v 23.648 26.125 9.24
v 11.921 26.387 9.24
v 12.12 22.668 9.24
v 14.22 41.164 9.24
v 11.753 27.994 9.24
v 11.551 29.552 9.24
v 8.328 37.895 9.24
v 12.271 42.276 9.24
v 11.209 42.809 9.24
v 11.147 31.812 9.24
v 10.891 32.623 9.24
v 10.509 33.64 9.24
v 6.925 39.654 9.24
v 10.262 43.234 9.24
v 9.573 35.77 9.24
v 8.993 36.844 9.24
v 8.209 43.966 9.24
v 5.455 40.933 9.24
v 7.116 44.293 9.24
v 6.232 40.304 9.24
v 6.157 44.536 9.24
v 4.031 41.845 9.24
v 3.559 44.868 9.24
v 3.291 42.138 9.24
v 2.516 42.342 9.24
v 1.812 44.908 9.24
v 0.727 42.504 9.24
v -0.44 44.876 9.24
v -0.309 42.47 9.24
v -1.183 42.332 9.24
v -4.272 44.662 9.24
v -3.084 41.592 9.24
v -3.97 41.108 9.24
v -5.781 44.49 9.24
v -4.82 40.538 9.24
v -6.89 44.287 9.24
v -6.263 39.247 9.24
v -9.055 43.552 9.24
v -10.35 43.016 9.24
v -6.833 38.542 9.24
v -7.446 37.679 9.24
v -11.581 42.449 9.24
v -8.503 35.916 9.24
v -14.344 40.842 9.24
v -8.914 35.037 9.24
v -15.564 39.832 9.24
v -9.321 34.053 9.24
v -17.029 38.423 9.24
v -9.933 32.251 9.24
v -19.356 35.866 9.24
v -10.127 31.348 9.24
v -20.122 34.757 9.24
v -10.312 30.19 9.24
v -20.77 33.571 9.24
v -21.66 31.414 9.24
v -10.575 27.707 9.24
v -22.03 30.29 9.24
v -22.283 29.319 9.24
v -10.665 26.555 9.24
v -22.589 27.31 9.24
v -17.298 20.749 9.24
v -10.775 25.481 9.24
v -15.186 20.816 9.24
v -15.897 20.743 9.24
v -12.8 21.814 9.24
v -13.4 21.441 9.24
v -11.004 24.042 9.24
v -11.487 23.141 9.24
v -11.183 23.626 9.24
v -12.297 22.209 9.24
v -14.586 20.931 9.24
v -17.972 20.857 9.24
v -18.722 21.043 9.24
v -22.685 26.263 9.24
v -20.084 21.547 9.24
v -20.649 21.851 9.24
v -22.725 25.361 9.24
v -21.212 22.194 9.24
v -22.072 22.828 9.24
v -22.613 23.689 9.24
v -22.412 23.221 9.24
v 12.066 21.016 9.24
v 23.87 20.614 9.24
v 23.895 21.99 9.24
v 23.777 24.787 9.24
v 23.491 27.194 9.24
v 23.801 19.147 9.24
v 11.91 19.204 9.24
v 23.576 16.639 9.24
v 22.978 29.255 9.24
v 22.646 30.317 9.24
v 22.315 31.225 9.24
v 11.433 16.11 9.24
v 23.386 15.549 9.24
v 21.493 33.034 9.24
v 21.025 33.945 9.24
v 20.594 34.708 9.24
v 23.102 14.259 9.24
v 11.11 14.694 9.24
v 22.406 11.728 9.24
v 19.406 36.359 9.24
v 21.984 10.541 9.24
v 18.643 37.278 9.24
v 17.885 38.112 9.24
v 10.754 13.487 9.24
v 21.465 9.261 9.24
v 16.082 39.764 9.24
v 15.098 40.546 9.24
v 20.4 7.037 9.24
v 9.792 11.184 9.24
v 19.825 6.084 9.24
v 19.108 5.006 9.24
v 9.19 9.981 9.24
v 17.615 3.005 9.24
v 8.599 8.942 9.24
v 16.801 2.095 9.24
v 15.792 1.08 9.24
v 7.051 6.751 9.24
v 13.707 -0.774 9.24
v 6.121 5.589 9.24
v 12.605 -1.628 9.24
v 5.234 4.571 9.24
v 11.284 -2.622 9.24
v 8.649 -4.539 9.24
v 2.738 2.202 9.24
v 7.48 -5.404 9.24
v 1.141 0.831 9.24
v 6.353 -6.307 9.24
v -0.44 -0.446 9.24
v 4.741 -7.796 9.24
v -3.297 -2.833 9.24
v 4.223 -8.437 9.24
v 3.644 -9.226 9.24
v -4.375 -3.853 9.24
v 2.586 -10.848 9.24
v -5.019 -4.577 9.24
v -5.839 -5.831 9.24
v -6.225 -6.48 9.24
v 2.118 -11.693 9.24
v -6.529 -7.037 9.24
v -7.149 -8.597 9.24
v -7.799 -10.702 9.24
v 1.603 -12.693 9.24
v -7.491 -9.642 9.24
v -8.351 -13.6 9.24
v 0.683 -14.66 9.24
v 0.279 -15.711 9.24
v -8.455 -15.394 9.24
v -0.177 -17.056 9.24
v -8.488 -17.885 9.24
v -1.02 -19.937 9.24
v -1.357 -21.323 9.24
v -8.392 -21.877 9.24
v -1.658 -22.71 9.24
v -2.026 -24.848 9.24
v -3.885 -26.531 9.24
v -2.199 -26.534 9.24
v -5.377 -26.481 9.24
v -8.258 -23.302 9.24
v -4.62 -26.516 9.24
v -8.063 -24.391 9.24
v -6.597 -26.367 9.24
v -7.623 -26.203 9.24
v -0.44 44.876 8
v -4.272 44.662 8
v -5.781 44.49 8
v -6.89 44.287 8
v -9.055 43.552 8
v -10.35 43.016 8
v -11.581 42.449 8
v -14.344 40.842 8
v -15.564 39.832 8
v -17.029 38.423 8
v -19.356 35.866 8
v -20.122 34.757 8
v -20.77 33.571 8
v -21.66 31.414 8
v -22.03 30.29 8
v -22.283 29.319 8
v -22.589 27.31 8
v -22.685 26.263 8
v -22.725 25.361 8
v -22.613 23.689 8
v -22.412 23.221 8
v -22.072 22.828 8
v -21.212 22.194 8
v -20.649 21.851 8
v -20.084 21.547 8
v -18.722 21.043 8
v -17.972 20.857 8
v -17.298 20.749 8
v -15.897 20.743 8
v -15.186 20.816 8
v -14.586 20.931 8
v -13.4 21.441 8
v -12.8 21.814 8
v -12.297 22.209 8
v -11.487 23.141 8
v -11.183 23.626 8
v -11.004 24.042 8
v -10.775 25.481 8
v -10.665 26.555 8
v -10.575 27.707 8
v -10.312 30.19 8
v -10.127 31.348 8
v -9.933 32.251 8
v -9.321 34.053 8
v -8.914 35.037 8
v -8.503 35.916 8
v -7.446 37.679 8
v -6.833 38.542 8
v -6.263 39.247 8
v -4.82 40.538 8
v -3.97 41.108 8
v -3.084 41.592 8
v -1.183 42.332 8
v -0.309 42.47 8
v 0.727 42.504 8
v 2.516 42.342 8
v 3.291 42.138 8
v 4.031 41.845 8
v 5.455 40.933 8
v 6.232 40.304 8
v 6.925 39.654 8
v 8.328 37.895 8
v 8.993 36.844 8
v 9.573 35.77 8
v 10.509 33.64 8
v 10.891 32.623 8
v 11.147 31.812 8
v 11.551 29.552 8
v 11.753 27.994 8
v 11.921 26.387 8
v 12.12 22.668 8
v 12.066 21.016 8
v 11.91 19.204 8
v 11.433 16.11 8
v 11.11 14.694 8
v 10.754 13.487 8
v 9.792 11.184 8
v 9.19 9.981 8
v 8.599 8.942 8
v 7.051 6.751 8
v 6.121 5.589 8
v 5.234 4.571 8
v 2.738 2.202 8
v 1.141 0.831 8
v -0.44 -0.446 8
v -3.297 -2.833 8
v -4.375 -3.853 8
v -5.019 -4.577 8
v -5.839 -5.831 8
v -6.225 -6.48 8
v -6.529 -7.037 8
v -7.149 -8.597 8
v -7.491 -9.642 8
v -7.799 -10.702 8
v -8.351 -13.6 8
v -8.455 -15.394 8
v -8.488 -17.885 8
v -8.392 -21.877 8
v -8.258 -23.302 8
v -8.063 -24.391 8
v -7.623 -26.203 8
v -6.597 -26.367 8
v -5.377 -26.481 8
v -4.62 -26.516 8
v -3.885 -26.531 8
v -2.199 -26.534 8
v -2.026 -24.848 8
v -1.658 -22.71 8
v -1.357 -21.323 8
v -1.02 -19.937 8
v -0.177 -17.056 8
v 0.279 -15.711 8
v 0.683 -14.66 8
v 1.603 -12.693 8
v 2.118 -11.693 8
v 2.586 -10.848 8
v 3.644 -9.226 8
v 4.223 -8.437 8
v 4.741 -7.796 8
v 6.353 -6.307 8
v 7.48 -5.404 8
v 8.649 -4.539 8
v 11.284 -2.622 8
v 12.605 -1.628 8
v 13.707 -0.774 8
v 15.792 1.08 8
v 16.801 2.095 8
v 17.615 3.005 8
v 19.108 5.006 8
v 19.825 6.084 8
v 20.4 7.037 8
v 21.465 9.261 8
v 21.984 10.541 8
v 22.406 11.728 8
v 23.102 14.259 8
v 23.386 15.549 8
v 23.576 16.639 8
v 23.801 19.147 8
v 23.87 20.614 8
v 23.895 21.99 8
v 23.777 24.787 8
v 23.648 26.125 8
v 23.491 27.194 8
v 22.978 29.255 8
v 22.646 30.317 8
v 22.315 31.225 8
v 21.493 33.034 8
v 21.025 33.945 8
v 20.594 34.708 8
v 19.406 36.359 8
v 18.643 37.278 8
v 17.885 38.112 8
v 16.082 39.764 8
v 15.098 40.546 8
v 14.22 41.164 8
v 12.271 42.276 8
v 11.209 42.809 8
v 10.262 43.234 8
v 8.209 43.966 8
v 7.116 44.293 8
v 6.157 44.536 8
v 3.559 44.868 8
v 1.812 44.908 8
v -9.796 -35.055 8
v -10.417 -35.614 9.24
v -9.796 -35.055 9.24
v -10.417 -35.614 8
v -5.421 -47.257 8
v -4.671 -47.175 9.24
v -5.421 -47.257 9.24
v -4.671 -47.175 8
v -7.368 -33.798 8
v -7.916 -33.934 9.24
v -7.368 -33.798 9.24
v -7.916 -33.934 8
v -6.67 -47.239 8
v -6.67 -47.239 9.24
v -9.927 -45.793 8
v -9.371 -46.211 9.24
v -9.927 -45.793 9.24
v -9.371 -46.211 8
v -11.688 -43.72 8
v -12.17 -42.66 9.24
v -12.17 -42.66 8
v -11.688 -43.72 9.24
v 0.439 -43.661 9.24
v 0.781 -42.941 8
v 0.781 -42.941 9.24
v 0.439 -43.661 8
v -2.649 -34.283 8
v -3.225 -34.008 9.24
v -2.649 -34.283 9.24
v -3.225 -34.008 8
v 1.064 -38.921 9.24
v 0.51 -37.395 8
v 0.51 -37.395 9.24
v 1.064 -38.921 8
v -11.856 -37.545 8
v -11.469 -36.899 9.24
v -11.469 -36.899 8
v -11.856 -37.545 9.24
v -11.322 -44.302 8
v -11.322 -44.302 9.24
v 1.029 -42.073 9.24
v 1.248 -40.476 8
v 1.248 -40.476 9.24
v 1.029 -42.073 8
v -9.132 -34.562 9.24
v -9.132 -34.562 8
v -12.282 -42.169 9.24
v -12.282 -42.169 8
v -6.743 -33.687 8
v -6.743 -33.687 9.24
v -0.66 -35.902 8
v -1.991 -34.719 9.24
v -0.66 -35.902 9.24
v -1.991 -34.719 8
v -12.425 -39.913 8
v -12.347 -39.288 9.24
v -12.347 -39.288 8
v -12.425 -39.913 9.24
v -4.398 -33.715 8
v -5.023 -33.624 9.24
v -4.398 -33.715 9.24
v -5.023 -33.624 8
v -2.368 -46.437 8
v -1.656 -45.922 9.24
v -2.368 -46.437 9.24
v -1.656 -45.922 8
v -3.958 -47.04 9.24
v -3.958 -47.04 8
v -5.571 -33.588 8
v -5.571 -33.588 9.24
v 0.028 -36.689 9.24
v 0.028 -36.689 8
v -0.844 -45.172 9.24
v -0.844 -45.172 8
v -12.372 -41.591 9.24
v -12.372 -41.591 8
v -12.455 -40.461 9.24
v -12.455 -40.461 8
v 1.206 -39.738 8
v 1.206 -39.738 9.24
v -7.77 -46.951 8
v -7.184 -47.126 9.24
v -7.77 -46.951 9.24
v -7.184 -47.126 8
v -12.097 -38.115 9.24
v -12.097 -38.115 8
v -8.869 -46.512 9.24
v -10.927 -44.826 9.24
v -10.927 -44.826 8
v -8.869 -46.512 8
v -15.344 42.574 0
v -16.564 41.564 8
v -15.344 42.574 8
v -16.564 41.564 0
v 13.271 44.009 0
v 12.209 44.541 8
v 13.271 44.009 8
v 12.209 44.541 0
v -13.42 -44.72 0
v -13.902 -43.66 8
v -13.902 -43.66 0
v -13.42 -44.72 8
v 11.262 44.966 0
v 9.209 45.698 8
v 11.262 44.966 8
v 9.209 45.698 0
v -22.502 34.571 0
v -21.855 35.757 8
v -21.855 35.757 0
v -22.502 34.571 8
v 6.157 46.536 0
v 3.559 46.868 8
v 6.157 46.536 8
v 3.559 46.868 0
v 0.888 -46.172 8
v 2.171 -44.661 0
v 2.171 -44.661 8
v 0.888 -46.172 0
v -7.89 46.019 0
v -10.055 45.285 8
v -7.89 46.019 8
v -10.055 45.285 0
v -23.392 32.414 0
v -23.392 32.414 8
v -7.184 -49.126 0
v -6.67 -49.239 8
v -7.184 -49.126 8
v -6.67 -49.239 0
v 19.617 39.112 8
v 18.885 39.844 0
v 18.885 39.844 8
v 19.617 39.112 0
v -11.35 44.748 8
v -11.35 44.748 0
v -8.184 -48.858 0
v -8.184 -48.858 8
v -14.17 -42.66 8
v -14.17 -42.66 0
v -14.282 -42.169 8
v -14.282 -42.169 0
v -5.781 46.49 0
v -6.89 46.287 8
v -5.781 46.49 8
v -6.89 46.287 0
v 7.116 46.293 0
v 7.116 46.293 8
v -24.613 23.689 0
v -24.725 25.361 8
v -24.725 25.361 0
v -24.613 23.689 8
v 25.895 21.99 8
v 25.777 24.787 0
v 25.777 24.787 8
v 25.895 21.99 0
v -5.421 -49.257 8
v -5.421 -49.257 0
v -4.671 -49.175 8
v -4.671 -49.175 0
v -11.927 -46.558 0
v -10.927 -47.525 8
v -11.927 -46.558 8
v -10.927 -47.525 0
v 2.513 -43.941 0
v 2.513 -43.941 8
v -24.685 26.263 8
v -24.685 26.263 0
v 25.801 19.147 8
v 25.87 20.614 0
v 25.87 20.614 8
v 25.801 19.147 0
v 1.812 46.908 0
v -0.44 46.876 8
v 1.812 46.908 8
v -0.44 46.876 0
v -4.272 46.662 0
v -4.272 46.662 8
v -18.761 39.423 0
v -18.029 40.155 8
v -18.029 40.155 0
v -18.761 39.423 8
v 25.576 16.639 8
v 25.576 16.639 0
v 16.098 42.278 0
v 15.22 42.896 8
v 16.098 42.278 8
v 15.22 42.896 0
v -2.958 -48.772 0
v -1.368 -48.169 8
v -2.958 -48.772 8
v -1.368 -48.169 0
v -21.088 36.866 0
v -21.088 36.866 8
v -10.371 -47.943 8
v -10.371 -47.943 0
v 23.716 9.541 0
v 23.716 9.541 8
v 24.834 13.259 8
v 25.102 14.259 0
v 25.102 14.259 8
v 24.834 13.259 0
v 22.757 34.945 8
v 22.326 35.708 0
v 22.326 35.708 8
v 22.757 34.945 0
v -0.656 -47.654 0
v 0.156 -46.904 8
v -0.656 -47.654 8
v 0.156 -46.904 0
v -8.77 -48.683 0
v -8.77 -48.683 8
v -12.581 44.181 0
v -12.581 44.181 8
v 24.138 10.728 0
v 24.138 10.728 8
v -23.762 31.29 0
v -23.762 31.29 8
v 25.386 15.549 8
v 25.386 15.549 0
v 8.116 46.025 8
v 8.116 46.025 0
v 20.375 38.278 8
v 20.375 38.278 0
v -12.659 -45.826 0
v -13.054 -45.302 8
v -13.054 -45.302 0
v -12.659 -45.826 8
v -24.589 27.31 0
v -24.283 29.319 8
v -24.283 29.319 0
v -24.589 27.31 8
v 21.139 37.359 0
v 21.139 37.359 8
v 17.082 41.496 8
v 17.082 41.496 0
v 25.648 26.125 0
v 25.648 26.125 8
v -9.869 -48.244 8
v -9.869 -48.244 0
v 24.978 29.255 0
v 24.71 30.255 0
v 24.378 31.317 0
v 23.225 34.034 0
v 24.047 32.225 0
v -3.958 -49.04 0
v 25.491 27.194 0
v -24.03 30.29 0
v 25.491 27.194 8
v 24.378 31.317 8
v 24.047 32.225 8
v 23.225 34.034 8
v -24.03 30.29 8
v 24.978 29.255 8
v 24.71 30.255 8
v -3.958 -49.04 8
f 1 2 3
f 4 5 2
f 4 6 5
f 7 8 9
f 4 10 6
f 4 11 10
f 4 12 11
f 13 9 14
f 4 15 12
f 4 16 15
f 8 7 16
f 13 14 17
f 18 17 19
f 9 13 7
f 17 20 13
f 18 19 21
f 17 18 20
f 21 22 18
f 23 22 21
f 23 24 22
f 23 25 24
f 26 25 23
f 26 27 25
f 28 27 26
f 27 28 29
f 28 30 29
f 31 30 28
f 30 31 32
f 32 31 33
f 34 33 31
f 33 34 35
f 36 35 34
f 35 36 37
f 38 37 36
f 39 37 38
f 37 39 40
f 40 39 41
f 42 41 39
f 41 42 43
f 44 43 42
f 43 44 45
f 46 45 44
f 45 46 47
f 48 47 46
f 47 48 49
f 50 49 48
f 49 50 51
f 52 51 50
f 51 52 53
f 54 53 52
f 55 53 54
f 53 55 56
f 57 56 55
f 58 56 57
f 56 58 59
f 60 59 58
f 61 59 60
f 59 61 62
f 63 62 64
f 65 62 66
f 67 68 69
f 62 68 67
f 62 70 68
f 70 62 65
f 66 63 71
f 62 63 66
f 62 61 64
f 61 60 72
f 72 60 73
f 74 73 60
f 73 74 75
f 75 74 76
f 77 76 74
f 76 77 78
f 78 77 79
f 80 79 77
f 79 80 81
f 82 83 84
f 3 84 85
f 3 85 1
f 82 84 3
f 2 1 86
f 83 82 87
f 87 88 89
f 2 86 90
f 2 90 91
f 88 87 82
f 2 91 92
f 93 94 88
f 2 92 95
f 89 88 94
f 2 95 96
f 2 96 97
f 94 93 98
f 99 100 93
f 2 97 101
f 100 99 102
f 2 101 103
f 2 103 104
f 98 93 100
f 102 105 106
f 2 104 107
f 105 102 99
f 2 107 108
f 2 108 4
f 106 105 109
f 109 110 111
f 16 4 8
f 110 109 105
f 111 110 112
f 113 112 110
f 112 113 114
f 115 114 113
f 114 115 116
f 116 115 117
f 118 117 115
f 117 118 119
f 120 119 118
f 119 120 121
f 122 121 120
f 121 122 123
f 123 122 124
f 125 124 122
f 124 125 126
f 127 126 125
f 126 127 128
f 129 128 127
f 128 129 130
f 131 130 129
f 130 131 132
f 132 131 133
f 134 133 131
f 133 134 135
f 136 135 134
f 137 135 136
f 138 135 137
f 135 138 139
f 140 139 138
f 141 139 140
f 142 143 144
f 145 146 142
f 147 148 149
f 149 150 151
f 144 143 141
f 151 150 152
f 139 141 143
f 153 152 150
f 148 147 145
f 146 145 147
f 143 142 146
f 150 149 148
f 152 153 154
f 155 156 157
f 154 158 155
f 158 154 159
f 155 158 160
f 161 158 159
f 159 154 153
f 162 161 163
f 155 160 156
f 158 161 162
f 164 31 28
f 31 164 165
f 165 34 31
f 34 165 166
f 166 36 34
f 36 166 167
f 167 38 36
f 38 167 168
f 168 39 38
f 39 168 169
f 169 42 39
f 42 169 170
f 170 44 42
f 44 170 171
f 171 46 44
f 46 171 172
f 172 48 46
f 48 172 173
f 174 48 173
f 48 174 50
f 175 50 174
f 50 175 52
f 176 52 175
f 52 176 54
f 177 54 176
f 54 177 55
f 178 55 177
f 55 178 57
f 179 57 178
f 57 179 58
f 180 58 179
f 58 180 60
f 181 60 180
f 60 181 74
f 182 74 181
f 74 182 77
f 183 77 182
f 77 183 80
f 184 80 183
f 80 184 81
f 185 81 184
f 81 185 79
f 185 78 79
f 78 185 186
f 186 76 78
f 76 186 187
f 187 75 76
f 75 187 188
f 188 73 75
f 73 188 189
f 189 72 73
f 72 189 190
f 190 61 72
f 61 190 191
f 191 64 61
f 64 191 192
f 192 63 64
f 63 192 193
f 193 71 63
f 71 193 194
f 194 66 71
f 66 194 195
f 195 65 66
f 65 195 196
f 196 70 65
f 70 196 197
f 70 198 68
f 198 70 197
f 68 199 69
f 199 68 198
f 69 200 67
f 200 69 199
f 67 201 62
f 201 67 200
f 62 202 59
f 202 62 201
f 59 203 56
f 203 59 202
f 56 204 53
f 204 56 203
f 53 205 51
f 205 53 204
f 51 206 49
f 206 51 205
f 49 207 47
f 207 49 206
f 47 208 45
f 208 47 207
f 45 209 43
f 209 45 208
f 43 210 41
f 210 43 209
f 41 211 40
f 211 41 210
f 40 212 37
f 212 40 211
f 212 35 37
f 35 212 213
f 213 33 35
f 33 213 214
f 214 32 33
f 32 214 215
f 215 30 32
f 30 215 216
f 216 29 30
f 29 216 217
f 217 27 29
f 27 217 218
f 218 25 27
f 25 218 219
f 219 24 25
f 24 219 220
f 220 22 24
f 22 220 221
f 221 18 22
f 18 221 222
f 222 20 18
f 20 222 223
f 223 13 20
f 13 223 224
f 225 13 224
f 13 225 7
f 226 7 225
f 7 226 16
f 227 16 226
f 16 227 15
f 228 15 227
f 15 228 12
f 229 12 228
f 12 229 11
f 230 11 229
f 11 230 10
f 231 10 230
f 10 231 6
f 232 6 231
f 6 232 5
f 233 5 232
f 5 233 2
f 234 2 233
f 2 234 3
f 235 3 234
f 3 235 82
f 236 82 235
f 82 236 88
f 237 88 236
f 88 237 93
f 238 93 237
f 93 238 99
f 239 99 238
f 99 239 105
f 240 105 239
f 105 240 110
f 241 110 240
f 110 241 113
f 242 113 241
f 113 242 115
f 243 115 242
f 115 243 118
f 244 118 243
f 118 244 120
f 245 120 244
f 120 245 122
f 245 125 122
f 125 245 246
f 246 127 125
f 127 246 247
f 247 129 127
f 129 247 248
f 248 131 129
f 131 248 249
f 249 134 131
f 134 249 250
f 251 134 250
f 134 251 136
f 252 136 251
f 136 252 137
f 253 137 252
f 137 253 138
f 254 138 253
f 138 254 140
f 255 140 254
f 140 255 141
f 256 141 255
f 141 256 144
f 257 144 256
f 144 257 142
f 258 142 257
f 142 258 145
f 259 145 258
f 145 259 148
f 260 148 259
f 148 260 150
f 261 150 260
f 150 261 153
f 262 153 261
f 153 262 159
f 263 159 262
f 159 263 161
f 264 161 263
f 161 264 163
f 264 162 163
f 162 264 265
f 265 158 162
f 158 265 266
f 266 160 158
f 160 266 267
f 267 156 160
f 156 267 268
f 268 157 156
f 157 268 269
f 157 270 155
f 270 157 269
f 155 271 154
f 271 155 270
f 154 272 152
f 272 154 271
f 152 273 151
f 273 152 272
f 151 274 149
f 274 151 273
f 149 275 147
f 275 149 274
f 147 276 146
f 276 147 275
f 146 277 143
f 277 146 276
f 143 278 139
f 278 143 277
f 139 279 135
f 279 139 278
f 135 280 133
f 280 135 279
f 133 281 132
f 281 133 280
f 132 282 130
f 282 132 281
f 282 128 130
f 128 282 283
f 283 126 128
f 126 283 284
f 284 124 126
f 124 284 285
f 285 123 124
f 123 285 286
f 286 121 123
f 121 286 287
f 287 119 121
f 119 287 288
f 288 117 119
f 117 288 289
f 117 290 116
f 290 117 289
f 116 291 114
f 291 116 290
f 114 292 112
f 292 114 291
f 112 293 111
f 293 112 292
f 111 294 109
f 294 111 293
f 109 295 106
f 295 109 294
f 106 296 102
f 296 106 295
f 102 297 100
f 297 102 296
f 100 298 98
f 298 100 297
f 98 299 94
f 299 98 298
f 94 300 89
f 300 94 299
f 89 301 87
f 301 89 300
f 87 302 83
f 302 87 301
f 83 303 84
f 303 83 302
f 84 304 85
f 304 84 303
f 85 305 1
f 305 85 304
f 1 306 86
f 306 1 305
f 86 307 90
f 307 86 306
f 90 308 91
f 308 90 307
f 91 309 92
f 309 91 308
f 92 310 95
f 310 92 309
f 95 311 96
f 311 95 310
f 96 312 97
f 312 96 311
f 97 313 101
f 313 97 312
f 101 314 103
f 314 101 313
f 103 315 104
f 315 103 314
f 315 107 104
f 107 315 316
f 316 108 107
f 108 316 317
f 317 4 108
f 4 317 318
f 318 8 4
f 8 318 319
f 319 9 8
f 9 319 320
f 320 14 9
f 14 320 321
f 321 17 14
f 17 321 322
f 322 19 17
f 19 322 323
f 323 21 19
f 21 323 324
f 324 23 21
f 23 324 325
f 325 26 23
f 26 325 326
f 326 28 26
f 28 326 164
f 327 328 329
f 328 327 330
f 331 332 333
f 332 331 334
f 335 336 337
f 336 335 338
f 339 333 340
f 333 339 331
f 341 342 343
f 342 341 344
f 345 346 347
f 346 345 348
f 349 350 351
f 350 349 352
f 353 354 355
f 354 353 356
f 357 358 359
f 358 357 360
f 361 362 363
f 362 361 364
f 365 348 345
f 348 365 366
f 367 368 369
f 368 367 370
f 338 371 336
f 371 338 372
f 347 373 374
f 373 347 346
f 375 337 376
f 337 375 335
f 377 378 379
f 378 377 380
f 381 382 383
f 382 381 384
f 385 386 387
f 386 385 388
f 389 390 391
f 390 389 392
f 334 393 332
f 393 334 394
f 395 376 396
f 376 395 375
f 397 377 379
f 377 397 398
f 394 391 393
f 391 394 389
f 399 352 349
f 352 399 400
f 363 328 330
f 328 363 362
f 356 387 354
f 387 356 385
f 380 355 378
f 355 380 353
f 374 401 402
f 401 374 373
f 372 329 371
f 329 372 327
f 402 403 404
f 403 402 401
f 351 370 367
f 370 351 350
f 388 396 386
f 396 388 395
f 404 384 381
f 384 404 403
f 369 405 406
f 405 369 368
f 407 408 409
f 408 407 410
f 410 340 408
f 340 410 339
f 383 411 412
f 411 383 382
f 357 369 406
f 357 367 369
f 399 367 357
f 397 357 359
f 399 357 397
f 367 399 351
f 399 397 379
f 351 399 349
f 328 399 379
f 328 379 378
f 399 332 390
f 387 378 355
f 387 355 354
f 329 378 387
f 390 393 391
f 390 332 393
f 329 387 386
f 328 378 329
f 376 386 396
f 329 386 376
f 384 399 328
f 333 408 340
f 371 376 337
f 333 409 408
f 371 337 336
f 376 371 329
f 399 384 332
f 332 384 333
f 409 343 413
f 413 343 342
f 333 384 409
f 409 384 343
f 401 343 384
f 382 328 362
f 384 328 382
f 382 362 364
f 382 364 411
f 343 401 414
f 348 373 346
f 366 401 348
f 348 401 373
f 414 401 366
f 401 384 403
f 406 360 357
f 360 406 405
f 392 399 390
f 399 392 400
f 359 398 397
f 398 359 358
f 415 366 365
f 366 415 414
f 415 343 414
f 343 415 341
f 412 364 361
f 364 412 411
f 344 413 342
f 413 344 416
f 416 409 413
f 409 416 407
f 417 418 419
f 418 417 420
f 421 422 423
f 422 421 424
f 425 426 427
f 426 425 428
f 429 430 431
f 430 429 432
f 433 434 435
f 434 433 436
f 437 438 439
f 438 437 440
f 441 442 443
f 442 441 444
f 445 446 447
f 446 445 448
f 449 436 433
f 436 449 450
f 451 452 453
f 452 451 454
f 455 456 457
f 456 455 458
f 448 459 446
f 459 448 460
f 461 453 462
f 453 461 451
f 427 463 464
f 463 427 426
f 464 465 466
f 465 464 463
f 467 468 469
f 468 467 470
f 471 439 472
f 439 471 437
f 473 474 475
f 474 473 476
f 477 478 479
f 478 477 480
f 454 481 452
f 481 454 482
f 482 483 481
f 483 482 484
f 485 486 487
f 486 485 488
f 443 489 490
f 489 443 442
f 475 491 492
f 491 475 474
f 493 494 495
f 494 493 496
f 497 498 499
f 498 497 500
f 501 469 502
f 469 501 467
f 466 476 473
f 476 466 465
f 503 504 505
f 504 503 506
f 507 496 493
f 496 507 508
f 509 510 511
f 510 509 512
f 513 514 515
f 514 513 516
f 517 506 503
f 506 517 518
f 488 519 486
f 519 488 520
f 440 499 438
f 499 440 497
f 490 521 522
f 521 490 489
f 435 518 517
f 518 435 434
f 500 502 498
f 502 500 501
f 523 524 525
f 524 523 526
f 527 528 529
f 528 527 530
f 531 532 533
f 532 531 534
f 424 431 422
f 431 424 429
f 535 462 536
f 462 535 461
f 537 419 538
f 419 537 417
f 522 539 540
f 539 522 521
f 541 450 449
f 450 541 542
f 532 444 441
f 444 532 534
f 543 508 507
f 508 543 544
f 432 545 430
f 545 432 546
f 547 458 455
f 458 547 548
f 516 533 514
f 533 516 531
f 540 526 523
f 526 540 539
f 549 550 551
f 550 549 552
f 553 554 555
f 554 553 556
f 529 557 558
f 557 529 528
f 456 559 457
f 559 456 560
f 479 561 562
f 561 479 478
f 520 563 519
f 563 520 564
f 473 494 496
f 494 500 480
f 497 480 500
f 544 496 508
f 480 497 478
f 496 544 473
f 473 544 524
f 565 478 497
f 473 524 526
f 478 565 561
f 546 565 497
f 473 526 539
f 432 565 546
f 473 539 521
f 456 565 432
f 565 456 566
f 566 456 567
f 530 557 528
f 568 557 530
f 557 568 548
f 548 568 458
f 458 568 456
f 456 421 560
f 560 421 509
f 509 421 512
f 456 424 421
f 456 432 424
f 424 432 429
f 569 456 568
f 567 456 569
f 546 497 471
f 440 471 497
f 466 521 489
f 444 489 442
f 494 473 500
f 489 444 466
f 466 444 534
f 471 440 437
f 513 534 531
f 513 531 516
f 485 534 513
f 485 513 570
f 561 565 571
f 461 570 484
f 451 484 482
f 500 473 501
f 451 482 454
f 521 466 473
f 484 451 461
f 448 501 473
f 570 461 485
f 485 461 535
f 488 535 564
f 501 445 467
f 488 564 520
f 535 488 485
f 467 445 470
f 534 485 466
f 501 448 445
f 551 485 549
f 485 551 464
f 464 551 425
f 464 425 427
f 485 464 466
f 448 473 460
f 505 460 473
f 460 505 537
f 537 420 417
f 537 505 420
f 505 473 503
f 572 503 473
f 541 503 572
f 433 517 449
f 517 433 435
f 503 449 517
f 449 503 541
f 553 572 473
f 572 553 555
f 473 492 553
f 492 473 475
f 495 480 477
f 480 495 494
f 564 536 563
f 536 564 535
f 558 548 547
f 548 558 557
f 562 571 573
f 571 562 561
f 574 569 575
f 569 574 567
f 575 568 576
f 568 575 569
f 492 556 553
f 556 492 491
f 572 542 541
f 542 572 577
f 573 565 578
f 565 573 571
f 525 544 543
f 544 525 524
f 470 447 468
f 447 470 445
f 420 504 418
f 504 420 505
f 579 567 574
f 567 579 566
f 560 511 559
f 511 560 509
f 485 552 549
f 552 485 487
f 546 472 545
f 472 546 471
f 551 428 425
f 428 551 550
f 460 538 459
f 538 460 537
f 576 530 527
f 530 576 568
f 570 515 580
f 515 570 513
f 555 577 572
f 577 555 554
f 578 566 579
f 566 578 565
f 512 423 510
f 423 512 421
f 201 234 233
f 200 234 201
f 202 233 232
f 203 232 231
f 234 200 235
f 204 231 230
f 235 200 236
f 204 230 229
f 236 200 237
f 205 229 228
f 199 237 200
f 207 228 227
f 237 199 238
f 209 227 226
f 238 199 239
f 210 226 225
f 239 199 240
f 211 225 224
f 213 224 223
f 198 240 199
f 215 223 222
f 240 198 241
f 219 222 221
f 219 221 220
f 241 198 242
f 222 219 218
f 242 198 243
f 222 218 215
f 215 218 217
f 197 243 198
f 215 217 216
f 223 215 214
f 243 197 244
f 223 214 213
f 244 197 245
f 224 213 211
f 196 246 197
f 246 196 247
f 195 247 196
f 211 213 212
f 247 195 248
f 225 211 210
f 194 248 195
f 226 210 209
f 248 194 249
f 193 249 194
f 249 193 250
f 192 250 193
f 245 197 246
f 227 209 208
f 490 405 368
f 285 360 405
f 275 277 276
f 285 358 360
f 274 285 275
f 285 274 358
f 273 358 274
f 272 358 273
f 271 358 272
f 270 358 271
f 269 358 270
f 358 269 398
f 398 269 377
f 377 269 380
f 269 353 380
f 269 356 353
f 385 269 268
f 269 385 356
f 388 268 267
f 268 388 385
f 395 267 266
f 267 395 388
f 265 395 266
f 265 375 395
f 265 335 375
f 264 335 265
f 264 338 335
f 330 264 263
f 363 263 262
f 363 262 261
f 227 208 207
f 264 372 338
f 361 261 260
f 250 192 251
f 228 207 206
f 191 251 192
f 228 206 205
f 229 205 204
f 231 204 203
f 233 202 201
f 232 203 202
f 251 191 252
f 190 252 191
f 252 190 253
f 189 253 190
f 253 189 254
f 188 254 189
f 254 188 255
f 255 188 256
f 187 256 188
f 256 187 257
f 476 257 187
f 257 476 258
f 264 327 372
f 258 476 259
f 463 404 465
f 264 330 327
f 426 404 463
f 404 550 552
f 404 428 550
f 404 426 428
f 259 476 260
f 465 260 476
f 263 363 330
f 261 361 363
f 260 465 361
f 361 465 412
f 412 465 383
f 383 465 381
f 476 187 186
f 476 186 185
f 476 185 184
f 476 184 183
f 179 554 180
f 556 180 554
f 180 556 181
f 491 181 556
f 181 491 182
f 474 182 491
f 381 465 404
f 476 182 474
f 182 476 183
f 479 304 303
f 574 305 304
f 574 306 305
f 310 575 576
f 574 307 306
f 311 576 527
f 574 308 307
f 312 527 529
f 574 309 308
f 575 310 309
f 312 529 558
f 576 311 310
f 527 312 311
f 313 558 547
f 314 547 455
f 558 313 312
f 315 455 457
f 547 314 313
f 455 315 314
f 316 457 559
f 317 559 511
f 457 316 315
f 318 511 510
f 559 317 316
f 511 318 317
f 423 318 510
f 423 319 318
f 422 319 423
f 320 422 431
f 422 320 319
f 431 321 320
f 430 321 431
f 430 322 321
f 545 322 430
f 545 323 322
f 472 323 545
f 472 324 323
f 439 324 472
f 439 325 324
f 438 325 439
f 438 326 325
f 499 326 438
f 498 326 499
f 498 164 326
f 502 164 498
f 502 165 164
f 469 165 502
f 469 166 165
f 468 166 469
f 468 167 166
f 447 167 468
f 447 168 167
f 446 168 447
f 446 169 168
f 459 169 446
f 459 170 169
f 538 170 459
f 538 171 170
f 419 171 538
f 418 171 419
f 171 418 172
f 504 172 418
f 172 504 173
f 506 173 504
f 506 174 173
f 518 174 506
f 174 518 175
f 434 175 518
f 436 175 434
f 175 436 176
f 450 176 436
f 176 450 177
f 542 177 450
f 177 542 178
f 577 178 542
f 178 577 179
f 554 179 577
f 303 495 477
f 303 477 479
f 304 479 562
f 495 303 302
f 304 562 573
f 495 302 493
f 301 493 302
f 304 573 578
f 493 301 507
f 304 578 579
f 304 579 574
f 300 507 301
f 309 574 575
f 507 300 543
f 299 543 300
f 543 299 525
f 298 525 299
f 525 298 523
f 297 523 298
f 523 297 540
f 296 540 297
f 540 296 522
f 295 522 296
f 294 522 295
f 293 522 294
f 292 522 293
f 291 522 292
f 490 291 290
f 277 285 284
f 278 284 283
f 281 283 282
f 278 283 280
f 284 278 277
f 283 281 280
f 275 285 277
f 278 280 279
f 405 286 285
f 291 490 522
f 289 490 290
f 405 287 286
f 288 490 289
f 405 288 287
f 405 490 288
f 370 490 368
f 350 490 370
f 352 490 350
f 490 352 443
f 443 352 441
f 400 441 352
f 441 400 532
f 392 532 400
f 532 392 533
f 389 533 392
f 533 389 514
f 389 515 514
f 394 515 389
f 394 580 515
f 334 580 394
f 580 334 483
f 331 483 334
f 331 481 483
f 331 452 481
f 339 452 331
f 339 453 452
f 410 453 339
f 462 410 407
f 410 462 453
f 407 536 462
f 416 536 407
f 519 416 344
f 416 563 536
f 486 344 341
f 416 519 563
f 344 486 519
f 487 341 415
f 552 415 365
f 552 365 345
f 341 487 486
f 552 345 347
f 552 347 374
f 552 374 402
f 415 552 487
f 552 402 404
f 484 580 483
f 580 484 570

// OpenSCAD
//------------------------------------------------------------
//	Stamp-o-Matic
//
//	input comes from:
//   http://chaaawa.com/stamp-o-matic/
//
//	http://thingiverse.com/Benjamin
//	http://www.thingiverse.com/thing:356988
//------------------------------------------------------------

// preview[view:south, tilt:top]

// paste here the Stamp-o-Matic output (see object page).
input = "no_input";

// (mm)
stamp_width = 60;
// (mm)
pattern_thickness = 1.25;
// (mm)
base_thickness = 8;
// margin around pattern (mm)
contour_radius = 2;

module void() {}

dispo_width = stamp_width - 2*contour_radius;

points_array = (input=="no_input"? [[191, 355, 2],[1,[[97,24.44],[97,24.44],[89.32,24.33],[83.361,24.468],[74.5,25.6],[74.5,25.6],[71.229,26.43],[67.5,27.546],[60.5,30.04],[60.5,30.04],[57.269,31.491],[53.648,33.307],[47,37.1],[47,37.1],[44.004,39.21],[40.648,41.877],[34.5,47.51],[34.5,47.51],[31.914,50.354],[29.31,53.491],[25.26,59.12],[25.26,59.12],[23.79,61.722],[22.193,64.831],[19.39,71],[19.39,71],[18.262,74.097],[17.13,77.721],[15.38,84.75],[15.38,84.75],[14.843,88.395],[14.405,92.957],[14,102.5],[14,102.5],[14.085,107.19],[14.32,112.195],[15.09,120.75],[15.09,120.75],[15.737,124.468],[16.706,128.866],[19.08,137.5],[19.08,137.5],[20.52,141.546],[22.29,145.912],[25.92,153.5],[25.92,153.5],[27.883,156.75],[30.328,160.427],[35.42,167.25],[35.42,167.25],[38.198,170.353],[41.638,173.818],[48.75,180.14],[48.75,180.14],[52.508,183.053],[57.015,186.443],[66,192.98],[66,192.98],[69.988,195.932],[73.831,199.011],[79.33,204.09],[79.33,204.09],[81.097,206.277],[83.072,208.968],[86.68,214.5],[86.68,214.5],[88.277,217.382],[90.033,220.793],[93.17,227.5],[93.17,227.5],[94.55,231.085],[96.105,235.674],[98.98,245.5],[98.98,245.5],[100.127,250.225],[101.156,254.958],[102.41,262.25],[103,268],[108.75,267.99],[108.75,267.99],[111.258,267.94],[113.84,267.818],[118,267.43],[121.5,266.87],[123,260.69],[123,260.69],[123.665,256.975],[124.122,252.115],[124.45,238.5],[124.45,238.5],[124.337,230.005],[123.983,223.887],[122.1,214],[122.1,214],[121.049,210.386],[119.882,206.823],[117.77,201.5],[117.77,201.5],[116.733,199.601],[115.416,197.387],[112.62,193.11],[112.62,193.11],[110.421,190.642],[106.745,187.163],[97,179.02],[97,179.02],[91.608,174.666],[86.162,169.988],[77.65,161.91],[77.65,161.91],[74.624,158.439],[71.452,154.473],[66.17,147],[66.17,147],[64.156,143.458],[62.101,139.355],[58.82,131.5],[58.82,131.5],[57.608,127.384],[56.504,122.552],[54.88,112],[54.88,112],[54.345,105.82],[54.162,100.185],[54.84,87.5],[54.84,87.5],[55.414,82.019],[56.103,76.705],[57.48,69],[57.48,69],[58.354,66.231],[59.658,62.763],[62.85,55.5],[62.85,55.5],[64.826,51.837],[67.095,48.252],[71.88,42.25],[71.88,42.25],[74.244,40.035],[76.893,37.888],[81.75,34.78],[81.75,34.78],[84.275,33.778],[86.919,33.085],[93.02,32.53],[93.02,32.53],[96.553,32.647],[99.535,33.117],[106.02,35.64],[106.02,35.64],[109.042,37.293],[111.938,39.238],[116.86,43.64],[116.86,43.64],[118.807,46.043],[120.897,48.986],[124.5,55],[124.5,55],[125.903,57.999],[127.292,61.355],[129.38,67.5],[129.38,67.5],[130.041,70.58],[130.673,74.53],[131.57,83],[131.57,83],[131.875,86.927],[132.251,90.592],[133.03,95.5],[133.03,95.5],[133.643,96.92],[134.68,98.572],[137.44,101.75],[137.44,101.75],[139.158,103.1],[141.202,104.372],[145.25,106.11],[145.25,106.11],[147.295,106.502],[149.721,106.75],[154.5,106.73],[154.5,106.73],[156.797,106.364],[159.355,105.729],[164,104.01],[164,104.01],[165.928,102.972],[167.847,101.802],[170.78,99.64],[170.78,99.64],[171.942,98.299],[172.626,96.703],[173.01,91],[173.01,91],[172.873,87.925],[172.543,84.355],[171.5,77.5],[171.5,77.5],[170.637,74.19],[169.377,70.355],[166.34,63],[166.34,63],[164.132,58.955],[161.519,55.171],[153.58,46.45],[153.58,46.45],[148.584,41.645],[144.425,38.201],[135,32.72],[135,32.72],[130.801,30.784],[126.385,28.955],[119,26.45],[119,26.45],[115.219,25.757],[110.07,25.171],[97,24.44]]],[1,[[114.5,292.06],[114.5,292.06],[112.631,292.183],[110.5,292.493],[106.5,293.49],[106.5,293.49],[104.536,294.429],[102.29,295.917],[97.75,299.95],[97.75,299.95],[95.405,302.635],[93.76,305.043],[91.87,310.25],[91.87,310.25],[91.386,313.036],[91.243,315.553],[91.99,321],[91.99,321],[92.835,323.96],[94.003,326.416],[98.38,331.57],[98.38,331.57],[101.147,334.127],[103.577,335.883],[109,337.94],[109,337.94],[111.433,338.399],[113.988,338.681],[118.25,338.62],[118.25,338.62],[120.001,338.232],[122,337.635],[125.75,336.14],[125.75,336.14],[127.462,335.113],[129.357,333.688],[132.77,330.39],[132.77,330.39],[134.117,328.603],[135.366,326.616],[137.01,323],[137.01,323],[137.389,321.327],[137.697,319.355],[137.98,315.5],[137.98,315.5],[137.877,313.631],[137.613,311.5],[136.76,307.5],[136.76,307.5],[135.939,305.555],[134.618,303.351],[131.03,298.97],[131.03,298.97],[128.911,297.063],[126.648,295.381],[122.5,293.24],[122.5,293.24],[120.631,292.775],[118.5,292.398],[114.5,292.06]]]]: input);

input_width = points_array[0][0];
input_height= points_array[0][1];
tVersion = points_array[0][2] == undef ? 0: points_array[0][2];
sTrace = dispo_width/input_width;
stamp_height = input_height*sTrace + 2*contour_radius;

contour_r = (contour_radius <= 0) ? 0.001 : contour_radius;
//-------------------------------------------------------------------------------
union() {
	color("gray")
	translate([0, 0, base_thickness + pattern_thickness/2 -0.01]) 
	buildFrom(len(points_array)-1);
	
	color("lightgray")
	outline();
}
//-------------------------------------------------------------------------------
module outline() {
	hull() {
		for (i=[1:len(points_array)-1]) {
			if (points_array[i][0] == 1) {
				linear_extrude(height=base_thickness)
				minkowski() {						// idea from Oskar Linde
					circle(r=contour_r, $fn=12); 	// in scad-utils/morphology.scad outset module.
					shape2dNum(i);
				}
			}
		}	
	}
}
//-------------------------------------------------------------------------------
module buildFrom(pIndex) {
	if (pIndex < len(points_array) && pIndex > 0) {
		if (points_array[pIndex][0] == 0) {
			difference() {
				buildFrom(pIndex-1);
				shapeNum(pIndex, 2);
			}
		}
		else {
			union() {
				buildFrom(pIndex-1);
				shapeNum(pIndex);
			}
		}
	}
}
//-------------------------------------------------------------------------------
module shapeNum(pNum, zFact=1) {
	scale([-sTrace, -sTrace, 1])
	translate([-input_width/2, -input_height/2, -pattern_thickness*zFact/2]) 
	linear_extrude(height=pattern_thickness*zFact) {polygon(points_array[pNum][1]);}
}
//-------------------------------------------------------------------------------
module shape2dNum(pNum) {
	scale([-sTrace, -sTrace])
	translate([-input_width/2, -input_height/2]) 
	polygon(points_array[pNum][1]);
}
//-------------------------------------------------------------------------------
